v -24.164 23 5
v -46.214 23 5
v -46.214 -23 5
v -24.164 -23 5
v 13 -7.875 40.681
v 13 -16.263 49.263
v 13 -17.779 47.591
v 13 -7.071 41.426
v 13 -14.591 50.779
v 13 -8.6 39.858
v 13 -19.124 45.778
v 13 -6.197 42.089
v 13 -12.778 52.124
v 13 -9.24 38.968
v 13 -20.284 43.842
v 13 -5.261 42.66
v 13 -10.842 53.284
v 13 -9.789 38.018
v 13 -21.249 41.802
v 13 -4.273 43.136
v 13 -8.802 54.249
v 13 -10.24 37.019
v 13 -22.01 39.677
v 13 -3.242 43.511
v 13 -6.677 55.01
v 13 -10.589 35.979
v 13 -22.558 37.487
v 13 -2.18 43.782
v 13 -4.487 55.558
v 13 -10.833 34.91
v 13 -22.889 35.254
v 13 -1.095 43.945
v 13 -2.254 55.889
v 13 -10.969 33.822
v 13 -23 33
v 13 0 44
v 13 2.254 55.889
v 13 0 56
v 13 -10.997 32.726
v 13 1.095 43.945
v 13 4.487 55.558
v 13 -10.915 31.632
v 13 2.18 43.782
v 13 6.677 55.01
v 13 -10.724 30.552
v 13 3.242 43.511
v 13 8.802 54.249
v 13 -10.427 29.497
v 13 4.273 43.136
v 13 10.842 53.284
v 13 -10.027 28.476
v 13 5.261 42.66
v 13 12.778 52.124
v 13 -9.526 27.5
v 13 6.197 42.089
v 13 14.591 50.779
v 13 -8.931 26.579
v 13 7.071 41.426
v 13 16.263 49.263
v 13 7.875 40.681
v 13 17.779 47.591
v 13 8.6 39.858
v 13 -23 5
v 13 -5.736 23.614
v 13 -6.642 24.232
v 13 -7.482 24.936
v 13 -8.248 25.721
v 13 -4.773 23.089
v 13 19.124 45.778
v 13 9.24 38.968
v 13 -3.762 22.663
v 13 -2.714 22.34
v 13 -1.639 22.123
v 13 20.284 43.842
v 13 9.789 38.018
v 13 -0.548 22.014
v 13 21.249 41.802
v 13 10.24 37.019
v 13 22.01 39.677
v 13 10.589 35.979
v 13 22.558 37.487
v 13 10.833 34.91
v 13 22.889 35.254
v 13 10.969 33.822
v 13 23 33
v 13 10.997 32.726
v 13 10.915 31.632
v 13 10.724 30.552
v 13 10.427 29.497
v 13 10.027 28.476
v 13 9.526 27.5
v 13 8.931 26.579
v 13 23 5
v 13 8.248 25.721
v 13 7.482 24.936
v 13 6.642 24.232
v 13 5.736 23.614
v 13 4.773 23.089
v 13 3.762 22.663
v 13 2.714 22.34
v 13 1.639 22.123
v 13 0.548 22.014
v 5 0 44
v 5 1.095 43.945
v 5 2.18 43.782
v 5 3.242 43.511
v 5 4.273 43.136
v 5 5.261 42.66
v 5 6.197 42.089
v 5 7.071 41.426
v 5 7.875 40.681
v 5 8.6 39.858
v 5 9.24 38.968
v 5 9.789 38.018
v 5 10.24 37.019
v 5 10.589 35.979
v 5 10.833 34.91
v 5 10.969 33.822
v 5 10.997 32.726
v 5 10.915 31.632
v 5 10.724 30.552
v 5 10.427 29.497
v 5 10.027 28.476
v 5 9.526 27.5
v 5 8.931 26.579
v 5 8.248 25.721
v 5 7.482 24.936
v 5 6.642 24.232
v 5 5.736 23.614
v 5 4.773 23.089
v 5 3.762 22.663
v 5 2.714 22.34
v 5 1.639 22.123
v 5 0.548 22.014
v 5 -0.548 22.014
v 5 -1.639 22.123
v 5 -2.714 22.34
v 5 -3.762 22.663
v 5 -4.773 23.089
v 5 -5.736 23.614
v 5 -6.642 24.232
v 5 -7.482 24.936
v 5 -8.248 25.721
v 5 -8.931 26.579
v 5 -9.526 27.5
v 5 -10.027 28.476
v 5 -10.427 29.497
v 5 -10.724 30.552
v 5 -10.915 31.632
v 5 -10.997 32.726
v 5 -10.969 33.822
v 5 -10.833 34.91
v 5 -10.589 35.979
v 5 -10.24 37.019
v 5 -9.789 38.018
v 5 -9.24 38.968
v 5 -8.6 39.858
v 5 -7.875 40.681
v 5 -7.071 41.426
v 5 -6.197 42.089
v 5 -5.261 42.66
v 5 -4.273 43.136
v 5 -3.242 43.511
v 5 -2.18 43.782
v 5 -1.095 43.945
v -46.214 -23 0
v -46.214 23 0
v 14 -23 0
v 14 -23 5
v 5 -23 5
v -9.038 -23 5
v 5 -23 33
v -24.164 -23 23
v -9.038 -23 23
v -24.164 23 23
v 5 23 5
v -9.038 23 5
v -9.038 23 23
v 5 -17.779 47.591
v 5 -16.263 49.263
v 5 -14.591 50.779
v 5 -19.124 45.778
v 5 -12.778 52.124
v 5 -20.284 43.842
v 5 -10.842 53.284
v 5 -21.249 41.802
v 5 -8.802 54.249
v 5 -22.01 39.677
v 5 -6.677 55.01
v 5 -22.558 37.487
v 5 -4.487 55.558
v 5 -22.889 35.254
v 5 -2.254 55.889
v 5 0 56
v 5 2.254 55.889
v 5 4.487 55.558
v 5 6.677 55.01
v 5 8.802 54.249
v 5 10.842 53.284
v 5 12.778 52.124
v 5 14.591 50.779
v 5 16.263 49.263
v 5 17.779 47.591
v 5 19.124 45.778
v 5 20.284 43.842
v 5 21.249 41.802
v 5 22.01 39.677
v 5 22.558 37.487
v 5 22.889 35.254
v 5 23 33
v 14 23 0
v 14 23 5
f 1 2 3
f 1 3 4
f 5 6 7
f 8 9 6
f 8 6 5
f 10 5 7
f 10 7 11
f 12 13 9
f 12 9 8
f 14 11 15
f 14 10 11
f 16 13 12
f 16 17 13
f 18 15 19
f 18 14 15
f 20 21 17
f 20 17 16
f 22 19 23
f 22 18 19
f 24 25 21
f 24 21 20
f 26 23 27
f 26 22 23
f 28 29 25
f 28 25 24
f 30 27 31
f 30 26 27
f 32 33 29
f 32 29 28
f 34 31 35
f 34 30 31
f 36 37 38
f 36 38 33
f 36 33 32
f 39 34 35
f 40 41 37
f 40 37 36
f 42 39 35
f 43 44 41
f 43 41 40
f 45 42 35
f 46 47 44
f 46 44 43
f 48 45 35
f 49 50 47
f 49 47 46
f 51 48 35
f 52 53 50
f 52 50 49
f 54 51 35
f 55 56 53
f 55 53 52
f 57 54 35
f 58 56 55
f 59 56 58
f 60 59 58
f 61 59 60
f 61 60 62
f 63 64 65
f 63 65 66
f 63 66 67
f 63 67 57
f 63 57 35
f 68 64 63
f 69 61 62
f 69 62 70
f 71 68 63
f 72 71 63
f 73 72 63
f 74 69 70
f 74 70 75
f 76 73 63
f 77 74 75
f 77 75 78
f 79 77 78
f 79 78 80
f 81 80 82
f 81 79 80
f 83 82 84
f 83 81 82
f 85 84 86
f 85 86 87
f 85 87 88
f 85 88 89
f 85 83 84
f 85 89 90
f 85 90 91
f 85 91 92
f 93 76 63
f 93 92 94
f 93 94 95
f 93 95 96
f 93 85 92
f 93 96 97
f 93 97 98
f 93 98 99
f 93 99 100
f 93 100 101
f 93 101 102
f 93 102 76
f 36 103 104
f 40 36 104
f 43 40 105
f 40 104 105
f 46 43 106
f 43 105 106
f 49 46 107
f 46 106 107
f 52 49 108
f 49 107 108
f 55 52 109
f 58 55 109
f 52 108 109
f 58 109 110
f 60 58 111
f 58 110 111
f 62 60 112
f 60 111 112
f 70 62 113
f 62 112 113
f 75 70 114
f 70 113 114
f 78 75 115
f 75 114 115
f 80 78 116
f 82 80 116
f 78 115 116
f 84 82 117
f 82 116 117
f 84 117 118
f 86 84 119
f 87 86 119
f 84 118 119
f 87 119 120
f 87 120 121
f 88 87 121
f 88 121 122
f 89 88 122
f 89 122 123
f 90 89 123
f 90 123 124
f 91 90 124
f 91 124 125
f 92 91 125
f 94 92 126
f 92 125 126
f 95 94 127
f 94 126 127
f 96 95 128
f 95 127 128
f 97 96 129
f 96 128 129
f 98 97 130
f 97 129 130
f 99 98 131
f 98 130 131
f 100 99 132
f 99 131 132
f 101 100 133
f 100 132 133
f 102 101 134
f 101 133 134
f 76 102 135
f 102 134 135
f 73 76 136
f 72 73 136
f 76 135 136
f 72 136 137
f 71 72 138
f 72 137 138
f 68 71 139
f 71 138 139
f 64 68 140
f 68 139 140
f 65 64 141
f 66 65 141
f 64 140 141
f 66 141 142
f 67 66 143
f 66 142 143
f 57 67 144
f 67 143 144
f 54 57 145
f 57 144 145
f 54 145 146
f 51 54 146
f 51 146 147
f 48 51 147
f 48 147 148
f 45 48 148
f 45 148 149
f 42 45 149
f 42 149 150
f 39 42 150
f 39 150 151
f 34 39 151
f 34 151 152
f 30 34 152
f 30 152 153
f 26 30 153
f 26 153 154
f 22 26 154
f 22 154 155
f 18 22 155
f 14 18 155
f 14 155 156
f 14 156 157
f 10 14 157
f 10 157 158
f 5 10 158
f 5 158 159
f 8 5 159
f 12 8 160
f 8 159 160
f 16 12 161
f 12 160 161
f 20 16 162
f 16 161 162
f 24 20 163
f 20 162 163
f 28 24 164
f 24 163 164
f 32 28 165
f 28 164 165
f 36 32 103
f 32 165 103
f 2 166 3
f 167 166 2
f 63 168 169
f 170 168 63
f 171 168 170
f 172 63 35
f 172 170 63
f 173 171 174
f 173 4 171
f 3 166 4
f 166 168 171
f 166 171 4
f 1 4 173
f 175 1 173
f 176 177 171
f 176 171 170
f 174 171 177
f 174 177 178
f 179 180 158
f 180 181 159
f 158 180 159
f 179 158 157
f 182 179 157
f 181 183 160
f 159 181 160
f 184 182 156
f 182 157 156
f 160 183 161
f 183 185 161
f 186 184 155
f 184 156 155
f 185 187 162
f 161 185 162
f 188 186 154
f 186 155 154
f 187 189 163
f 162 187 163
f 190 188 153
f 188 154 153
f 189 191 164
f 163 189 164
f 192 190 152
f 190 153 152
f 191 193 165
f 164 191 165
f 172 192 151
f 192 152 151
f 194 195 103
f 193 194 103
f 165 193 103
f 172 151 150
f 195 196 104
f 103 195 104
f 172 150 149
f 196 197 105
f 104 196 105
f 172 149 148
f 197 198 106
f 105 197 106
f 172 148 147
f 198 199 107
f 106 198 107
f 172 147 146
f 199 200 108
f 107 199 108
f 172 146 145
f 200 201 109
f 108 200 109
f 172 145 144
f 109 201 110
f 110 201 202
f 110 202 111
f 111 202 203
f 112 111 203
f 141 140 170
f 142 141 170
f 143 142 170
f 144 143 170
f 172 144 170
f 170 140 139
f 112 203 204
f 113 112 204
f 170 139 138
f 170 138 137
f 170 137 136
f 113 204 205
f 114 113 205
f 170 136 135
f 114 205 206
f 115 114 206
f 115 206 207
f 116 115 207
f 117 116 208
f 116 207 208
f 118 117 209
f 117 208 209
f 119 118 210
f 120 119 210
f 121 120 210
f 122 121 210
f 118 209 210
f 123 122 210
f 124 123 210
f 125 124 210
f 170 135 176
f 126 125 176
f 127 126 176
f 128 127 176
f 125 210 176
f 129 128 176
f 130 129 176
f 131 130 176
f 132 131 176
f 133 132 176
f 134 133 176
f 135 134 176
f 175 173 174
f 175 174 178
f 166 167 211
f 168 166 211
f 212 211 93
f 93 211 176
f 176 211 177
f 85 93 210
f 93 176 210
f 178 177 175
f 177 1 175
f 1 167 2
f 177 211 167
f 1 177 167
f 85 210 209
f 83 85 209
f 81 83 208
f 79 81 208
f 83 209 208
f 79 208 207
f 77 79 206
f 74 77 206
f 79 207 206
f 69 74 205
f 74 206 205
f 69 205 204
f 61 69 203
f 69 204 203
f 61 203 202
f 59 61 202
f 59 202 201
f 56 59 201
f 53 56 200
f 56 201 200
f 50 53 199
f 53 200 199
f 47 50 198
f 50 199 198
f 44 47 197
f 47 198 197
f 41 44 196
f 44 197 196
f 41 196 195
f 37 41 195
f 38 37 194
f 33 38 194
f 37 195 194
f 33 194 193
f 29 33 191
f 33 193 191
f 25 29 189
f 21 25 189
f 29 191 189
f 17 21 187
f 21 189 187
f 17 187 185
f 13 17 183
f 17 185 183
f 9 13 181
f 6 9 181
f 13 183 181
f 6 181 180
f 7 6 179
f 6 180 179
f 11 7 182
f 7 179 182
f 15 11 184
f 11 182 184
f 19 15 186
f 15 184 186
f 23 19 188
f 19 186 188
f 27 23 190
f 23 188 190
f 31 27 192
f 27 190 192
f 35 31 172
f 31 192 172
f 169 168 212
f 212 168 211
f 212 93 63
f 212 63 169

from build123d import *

# Parameters (mm, degrees)
ESQUISSE1_W        = 60.213993324
ESQUISSE1_H        = 46
BOSS_EXTRU_1_DEPTH = 5
ESQUISSE2_W        = 8
ESQUISSE2_H        = 46
ESQUISSE2_W_2      = 15.12622911
BOSS_EXTRU_2_DEPTH = 6
ESQUISSE8_R        = 11
BOSS_EXTRU_4_DEPTH = 8
ESQUISSE10_W       = 12
ESQUISSE10_H       = 46
BOSS_EXTRU_5_DEPTH = 15.12622911


with BuildPart() as part:
    # Esquisse1 → Boss.-Extru.1 (new body)
    with BuildSketch(Plane.XY):
        with Locations((-16.106996662, 0)):
            Rectangle(ESQUISSE1_W, ESQUISSE1_H)
    extrude(amount=BOSS_EXTRU_1_DEPTH)

    # Esquisse2 → Boss.-Extru.2 (add)
    with BuildSketch(Plane.XY.offset(5)):
        with Locations((9, 0)):
            Rectangle(ESQUISSE2_W, ESQUISSE2_H)
        with Locations((-16.60101476, 0)):
            Rectangle(ESQUISSE2_W_2, ESQUISSE2_H)
    extrude(amount=BOSS_EXTRU_2_DEPTH)

    # Esquisse8 → Boss.-Extru.4 (add)
    with BuildSketch(Plane.ZY.offset(-5)):
        with BuildLine():
            Line((33, -23), (11, -23))
            Line((11, -23), (11, 23))
            Line((11, 23), (33, 23))
            ThreePointArc((33, 23), (56, 0), (33, -23))
        make_face()
        with Locations((33, 0)):
            Circle(ESQUISSE8_R, mode=Mode.SUBTRACT)
    extrude(amount=-BOSS_EXTRU_4_DEPTH)

    # Esquisse10 → Boss.-Extru.5 (add)
    with BuildSketch(Plane.ZY.offset(24.164129315)):
        with Locations((17, 0)):
            Rectangle(ESQUISSE10_W, ESQUISSE10_H)
    extrude(amount=-BOSS_EXTRU_5_DEPTH)


solid = part.part
